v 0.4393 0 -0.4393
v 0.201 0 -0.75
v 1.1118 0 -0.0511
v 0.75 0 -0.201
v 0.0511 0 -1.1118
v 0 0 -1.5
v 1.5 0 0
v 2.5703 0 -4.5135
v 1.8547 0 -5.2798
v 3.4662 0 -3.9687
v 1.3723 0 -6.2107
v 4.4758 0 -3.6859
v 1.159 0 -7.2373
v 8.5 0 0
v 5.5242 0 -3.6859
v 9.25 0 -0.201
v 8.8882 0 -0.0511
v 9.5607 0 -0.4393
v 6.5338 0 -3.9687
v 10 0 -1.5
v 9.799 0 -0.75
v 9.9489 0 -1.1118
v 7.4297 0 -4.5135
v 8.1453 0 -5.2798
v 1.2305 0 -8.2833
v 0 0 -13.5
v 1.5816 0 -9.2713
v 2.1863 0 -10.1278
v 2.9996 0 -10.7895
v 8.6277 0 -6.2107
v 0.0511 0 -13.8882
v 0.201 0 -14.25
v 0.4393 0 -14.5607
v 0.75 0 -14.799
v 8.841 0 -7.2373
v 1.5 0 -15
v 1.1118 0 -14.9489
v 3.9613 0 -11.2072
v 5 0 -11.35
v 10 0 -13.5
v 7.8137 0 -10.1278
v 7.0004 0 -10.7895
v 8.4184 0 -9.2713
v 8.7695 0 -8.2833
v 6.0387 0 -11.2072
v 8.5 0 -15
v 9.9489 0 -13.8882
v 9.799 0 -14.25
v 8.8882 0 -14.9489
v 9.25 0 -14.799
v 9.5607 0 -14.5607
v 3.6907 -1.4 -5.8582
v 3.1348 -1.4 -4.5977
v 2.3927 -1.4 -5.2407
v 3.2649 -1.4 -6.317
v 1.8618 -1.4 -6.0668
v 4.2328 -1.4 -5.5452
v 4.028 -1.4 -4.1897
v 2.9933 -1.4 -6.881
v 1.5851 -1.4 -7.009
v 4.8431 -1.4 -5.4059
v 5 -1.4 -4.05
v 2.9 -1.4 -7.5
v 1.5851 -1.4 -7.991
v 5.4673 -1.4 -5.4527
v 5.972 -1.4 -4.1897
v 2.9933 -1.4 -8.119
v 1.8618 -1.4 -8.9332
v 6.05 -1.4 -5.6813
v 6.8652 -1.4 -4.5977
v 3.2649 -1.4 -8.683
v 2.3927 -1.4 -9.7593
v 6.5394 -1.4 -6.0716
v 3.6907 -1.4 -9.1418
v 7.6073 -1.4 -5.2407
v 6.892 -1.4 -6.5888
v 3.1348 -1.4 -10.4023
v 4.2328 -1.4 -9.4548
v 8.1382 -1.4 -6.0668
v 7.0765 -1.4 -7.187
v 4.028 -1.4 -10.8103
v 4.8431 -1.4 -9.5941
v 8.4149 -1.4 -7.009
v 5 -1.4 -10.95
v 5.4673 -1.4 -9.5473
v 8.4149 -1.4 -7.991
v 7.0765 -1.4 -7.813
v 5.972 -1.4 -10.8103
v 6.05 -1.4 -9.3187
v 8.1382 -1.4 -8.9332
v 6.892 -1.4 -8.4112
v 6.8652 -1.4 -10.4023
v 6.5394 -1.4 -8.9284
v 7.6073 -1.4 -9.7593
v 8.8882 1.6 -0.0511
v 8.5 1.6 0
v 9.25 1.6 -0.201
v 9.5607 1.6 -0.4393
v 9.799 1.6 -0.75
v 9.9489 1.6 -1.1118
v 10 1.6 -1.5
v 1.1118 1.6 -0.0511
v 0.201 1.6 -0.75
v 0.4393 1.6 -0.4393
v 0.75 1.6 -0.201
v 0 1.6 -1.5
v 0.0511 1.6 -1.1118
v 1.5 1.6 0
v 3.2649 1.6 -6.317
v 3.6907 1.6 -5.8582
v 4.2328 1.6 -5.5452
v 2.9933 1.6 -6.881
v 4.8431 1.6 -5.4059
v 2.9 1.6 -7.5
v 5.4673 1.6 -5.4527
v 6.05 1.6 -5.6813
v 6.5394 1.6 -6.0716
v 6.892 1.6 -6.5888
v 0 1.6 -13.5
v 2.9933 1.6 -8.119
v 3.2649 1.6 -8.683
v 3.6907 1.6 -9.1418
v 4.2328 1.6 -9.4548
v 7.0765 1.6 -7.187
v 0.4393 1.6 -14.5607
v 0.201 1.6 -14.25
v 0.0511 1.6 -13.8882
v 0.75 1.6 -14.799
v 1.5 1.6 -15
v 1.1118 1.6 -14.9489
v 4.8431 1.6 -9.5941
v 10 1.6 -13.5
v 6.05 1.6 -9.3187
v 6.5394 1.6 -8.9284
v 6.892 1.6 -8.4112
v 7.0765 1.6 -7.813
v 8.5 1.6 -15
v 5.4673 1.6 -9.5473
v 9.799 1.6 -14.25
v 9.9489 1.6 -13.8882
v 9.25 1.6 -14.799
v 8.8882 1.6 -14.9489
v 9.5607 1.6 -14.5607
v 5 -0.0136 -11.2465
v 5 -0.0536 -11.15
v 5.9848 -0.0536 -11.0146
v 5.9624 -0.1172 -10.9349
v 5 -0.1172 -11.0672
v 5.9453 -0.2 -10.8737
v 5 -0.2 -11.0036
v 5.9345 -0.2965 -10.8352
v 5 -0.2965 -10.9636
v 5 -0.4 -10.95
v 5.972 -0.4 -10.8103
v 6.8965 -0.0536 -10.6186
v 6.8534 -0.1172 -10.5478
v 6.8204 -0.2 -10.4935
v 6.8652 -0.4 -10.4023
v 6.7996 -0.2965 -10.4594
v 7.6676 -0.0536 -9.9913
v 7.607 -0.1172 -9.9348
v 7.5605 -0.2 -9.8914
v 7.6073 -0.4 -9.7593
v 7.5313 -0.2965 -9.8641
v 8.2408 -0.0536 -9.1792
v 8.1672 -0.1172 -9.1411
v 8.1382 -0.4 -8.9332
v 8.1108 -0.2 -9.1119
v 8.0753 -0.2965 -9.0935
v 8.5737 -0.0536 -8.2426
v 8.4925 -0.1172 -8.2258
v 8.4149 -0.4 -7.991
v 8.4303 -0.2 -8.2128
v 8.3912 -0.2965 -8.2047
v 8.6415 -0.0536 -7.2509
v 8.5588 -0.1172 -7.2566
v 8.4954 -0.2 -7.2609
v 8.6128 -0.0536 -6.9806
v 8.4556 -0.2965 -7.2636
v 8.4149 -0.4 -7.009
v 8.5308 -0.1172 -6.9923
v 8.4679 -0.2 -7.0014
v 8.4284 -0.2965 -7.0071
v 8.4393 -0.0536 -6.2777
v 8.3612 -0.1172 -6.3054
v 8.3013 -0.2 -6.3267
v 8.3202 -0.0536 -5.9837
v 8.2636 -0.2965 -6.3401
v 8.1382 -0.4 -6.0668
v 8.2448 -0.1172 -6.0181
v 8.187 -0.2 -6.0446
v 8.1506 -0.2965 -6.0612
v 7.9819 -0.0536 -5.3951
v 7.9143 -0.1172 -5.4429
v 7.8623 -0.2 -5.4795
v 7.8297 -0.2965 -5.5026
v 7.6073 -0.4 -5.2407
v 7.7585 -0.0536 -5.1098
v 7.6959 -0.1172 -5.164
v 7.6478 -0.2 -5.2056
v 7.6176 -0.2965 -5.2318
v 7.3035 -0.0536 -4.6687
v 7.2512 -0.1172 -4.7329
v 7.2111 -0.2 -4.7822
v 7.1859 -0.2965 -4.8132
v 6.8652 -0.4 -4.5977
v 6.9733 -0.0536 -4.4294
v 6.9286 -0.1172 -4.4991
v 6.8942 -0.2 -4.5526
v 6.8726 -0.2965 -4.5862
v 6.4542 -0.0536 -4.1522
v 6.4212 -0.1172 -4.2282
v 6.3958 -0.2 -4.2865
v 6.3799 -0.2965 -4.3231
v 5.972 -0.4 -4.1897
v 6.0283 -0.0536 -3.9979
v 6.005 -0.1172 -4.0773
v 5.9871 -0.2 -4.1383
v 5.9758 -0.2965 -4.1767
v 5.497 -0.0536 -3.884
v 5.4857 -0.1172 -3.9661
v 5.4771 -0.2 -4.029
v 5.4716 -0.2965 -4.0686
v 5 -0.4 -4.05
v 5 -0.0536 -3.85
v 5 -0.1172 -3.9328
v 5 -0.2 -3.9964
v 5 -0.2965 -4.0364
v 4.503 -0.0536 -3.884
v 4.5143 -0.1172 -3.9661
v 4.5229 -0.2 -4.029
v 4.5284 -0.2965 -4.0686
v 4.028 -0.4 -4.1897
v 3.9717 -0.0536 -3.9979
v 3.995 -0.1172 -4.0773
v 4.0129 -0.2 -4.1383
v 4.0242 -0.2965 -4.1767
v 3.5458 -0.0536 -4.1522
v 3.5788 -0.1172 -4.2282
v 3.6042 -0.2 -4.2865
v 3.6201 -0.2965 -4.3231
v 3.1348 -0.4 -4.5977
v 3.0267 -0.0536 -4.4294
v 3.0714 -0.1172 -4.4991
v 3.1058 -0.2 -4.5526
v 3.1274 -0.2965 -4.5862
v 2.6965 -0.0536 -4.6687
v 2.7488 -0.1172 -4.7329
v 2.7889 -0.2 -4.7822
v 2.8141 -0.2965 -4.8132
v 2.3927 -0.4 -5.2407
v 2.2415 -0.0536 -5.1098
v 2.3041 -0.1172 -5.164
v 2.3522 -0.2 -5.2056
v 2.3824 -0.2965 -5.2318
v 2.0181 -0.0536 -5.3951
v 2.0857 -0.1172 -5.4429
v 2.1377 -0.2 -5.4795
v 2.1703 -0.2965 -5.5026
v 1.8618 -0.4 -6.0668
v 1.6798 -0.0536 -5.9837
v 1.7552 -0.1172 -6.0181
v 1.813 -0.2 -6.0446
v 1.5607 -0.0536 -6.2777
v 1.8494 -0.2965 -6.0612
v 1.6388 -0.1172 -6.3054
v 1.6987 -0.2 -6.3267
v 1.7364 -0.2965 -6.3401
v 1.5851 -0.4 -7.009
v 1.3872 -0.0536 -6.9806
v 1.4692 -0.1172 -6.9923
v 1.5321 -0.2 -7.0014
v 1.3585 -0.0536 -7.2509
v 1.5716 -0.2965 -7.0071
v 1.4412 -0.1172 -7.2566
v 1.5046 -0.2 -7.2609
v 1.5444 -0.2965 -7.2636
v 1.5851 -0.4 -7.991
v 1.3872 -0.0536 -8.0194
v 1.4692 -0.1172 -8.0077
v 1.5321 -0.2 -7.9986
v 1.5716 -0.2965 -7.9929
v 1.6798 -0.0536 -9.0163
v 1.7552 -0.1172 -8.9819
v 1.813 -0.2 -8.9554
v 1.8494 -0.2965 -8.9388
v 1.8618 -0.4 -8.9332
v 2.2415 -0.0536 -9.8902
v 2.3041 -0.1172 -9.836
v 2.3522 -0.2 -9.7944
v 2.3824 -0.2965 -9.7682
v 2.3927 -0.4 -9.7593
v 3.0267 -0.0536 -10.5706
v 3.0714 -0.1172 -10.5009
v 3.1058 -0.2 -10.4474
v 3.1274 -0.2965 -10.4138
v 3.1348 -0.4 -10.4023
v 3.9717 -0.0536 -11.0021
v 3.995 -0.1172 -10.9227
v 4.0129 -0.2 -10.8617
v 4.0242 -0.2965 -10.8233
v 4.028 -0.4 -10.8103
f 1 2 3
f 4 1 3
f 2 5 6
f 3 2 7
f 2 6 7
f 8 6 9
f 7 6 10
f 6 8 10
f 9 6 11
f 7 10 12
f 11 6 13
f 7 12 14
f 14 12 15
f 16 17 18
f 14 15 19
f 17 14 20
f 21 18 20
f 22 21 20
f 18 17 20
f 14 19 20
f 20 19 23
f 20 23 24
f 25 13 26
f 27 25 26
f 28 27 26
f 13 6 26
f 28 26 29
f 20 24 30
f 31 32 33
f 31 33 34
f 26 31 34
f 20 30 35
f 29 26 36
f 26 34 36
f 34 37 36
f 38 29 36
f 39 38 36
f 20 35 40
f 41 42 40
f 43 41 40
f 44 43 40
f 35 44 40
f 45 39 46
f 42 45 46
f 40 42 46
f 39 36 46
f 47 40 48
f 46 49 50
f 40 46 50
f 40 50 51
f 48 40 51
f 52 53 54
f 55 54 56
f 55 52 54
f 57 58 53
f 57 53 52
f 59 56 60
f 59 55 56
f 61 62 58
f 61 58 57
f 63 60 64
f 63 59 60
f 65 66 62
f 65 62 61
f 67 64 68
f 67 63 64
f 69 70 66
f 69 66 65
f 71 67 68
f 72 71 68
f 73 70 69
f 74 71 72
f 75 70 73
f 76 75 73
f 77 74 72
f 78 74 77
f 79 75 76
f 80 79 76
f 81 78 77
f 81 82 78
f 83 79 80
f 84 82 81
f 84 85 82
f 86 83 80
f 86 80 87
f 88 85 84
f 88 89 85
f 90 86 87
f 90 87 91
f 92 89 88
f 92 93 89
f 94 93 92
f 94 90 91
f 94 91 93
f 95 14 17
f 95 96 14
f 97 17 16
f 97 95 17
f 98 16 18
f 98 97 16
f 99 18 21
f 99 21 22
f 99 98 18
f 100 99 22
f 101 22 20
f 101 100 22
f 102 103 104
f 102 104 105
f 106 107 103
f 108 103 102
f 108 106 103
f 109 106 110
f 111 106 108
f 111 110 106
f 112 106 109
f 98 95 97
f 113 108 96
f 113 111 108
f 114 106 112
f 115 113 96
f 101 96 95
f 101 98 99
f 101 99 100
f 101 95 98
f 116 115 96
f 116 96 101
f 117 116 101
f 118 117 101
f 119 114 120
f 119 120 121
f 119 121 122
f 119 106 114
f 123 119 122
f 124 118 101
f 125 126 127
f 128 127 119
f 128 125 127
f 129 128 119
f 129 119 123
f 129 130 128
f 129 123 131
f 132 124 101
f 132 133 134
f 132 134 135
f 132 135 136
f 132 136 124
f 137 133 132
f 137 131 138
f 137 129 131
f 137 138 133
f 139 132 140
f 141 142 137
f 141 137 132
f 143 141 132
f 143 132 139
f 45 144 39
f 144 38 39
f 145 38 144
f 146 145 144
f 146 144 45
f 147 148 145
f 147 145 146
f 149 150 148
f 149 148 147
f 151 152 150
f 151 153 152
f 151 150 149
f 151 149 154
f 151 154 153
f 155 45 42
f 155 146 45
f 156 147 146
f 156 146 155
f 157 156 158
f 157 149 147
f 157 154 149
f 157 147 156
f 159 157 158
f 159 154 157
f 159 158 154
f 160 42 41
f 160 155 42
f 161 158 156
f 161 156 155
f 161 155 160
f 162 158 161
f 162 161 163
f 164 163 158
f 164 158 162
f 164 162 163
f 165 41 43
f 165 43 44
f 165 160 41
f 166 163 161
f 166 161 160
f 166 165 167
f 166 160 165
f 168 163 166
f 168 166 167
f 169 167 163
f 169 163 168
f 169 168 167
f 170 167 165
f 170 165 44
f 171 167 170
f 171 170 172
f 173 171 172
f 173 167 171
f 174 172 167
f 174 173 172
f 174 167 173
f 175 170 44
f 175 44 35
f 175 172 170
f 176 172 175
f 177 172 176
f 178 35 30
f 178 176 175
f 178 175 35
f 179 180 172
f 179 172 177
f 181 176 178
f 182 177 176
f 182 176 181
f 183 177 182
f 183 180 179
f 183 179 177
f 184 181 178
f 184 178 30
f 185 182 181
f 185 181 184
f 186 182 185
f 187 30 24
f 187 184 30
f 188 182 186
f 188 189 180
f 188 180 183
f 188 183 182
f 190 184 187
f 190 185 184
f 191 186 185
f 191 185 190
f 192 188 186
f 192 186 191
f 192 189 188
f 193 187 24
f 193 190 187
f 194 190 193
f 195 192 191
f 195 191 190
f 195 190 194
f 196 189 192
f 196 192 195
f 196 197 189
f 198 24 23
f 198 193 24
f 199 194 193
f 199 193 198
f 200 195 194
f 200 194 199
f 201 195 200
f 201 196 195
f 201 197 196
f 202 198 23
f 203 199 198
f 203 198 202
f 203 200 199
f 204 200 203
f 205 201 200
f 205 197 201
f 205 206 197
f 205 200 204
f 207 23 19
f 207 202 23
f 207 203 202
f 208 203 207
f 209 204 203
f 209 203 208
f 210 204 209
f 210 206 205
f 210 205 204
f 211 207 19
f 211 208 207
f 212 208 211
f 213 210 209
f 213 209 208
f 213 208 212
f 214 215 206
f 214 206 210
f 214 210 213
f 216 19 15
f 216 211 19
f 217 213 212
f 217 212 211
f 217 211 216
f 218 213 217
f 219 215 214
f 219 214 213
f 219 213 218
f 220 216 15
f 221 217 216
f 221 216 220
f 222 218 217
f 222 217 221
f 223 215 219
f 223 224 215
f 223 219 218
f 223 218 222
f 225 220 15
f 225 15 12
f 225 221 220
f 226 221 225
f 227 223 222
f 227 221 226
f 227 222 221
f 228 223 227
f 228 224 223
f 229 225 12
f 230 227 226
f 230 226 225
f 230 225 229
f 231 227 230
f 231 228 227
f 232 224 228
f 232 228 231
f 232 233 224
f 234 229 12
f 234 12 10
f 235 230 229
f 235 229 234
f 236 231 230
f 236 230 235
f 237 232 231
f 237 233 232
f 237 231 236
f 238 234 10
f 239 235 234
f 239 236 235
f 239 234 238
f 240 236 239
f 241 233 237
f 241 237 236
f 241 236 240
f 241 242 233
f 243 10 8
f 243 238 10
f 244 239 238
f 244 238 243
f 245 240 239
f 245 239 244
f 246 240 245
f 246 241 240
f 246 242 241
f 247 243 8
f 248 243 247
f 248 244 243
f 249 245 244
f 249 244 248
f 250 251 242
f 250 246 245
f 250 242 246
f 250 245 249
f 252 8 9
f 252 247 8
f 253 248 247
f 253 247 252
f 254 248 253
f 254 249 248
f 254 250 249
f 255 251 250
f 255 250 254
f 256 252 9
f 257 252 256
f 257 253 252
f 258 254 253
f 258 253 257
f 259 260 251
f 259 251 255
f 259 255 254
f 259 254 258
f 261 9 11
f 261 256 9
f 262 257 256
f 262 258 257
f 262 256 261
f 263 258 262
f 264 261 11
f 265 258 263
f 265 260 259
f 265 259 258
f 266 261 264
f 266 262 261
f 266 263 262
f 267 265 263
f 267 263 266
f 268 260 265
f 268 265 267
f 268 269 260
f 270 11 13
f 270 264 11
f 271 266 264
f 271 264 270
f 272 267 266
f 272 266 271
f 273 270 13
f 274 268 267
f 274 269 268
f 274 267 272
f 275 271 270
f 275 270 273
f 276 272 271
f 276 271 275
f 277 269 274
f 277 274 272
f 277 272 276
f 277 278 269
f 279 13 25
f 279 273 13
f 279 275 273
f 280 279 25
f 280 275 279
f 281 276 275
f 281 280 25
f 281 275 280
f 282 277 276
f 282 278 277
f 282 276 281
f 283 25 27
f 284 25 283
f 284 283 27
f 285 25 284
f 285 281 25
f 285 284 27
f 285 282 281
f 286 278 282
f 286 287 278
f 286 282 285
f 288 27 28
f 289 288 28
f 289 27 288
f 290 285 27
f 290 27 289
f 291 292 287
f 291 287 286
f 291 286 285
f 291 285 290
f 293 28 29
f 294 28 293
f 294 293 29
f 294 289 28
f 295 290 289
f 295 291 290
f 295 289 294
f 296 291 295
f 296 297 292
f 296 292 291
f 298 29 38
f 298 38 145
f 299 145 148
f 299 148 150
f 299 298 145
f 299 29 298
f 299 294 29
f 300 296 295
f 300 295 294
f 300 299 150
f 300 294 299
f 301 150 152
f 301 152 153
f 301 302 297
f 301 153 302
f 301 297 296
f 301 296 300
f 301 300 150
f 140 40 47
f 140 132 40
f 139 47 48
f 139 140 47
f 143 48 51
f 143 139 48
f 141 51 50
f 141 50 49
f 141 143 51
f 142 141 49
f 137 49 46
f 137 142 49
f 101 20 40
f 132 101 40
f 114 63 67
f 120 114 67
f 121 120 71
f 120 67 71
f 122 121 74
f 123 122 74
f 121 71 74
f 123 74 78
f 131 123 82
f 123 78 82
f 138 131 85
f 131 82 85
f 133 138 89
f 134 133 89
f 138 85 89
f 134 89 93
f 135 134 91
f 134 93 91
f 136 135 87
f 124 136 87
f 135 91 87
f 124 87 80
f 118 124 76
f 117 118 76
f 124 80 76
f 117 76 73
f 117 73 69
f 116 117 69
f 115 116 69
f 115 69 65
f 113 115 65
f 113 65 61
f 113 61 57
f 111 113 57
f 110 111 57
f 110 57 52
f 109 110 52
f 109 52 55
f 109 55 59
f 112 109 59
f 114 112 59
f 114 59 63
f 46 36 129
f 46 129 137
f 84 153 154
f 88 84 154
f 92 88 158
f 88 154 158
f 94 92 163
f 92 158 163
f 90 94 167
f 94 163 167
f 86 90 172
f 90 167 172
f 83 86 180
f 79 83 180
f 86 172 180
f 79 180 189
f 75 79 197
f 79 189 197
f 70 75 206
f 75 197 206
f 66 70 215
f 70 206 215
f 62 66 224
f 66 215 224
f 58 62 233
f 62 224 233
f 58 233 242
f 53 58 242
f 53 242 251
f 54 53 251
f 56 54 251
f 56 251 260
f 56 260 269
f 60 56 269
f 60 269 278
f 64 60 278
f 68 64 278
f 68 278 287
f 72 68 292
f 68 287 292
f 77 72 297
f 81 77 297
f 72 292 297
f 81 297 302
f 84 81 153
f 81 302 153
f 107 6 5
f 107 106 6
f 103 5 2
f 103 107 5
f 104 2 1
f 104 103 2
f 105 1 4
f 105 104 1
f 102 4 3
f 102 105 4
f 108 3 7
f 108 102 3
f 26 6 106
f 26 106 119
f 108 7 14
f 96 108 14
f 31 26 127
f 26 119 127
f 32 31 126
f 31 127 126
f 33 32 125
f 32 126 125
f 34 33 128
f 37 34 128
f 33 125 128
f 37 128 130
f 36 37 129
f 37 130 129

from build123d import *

# Parameters (mm, degrees)
SKETCH1_W             = 10
SKETCH1_H             = 15
BOSS_EXTRUDE1_DEPTH   = 1.6
FILLET1_R             = 1.5
SKETCH2_R             = 3.45
BOSS_EXTRUDE2_DEPTH   = 1.4
M5X0_8_TAPPED_HOLE1_D = 4.2
FILLET2_R             = 0.4


with BuildPart() as part:
    # Sketch1 → Boss-Extrude1 (new body)
    with BuildSketch(Plane(origin=(0, 0, 0), x_dir=(1, 0, 0), z_dir=(0, 1, 0))):
        with Locations((5, 7.5)):
            Rectangle(SKETCH1_W, SKETCH1_H)
    extrude(amount=BOSS_EXTRUDE1_DEPTH)

    # Fillet1
    fillet1_edges = [part.edges().sort_by_distance(p)[0] for p in [
        (0, 0.8, -15),
        (10, 0.8, -15),
        (10, 0.8, 0),
        (0, 0.8, 0),
    ]]
    fillet(fillet1_edges, radius=FILLET1_R)

    # Sketch2 → Boss-Extrude2 (add)
    with BuildSketch(Plane.XZ):
        with Locations(Location((5, -7.5, 0), (0, 0, 270))):
            Circle(SKETCH2_R)
    extrude(amount=BOSS_EXTRUDE2_DEPTH)

    # M5x0.8 Tapped Hole1 (through all)
    with Locations(Plane(origin=(0, 1.6, 0), x_dir=(1, 0, 0), z_dir=(0, 1, 0))):
        with Locations((5, 7.5)):
            Hole(M5X0_8_TAPPED_HOLE1_D / 2)

    # Fillet2
    fillet2_edges = [part.edges().sort_by_distance(p)[0] for p in [
        (5, 0, -4.05),
    ]]
    fillet(fillet2_edges, radius=FILLET2_R)


solid = part.part
